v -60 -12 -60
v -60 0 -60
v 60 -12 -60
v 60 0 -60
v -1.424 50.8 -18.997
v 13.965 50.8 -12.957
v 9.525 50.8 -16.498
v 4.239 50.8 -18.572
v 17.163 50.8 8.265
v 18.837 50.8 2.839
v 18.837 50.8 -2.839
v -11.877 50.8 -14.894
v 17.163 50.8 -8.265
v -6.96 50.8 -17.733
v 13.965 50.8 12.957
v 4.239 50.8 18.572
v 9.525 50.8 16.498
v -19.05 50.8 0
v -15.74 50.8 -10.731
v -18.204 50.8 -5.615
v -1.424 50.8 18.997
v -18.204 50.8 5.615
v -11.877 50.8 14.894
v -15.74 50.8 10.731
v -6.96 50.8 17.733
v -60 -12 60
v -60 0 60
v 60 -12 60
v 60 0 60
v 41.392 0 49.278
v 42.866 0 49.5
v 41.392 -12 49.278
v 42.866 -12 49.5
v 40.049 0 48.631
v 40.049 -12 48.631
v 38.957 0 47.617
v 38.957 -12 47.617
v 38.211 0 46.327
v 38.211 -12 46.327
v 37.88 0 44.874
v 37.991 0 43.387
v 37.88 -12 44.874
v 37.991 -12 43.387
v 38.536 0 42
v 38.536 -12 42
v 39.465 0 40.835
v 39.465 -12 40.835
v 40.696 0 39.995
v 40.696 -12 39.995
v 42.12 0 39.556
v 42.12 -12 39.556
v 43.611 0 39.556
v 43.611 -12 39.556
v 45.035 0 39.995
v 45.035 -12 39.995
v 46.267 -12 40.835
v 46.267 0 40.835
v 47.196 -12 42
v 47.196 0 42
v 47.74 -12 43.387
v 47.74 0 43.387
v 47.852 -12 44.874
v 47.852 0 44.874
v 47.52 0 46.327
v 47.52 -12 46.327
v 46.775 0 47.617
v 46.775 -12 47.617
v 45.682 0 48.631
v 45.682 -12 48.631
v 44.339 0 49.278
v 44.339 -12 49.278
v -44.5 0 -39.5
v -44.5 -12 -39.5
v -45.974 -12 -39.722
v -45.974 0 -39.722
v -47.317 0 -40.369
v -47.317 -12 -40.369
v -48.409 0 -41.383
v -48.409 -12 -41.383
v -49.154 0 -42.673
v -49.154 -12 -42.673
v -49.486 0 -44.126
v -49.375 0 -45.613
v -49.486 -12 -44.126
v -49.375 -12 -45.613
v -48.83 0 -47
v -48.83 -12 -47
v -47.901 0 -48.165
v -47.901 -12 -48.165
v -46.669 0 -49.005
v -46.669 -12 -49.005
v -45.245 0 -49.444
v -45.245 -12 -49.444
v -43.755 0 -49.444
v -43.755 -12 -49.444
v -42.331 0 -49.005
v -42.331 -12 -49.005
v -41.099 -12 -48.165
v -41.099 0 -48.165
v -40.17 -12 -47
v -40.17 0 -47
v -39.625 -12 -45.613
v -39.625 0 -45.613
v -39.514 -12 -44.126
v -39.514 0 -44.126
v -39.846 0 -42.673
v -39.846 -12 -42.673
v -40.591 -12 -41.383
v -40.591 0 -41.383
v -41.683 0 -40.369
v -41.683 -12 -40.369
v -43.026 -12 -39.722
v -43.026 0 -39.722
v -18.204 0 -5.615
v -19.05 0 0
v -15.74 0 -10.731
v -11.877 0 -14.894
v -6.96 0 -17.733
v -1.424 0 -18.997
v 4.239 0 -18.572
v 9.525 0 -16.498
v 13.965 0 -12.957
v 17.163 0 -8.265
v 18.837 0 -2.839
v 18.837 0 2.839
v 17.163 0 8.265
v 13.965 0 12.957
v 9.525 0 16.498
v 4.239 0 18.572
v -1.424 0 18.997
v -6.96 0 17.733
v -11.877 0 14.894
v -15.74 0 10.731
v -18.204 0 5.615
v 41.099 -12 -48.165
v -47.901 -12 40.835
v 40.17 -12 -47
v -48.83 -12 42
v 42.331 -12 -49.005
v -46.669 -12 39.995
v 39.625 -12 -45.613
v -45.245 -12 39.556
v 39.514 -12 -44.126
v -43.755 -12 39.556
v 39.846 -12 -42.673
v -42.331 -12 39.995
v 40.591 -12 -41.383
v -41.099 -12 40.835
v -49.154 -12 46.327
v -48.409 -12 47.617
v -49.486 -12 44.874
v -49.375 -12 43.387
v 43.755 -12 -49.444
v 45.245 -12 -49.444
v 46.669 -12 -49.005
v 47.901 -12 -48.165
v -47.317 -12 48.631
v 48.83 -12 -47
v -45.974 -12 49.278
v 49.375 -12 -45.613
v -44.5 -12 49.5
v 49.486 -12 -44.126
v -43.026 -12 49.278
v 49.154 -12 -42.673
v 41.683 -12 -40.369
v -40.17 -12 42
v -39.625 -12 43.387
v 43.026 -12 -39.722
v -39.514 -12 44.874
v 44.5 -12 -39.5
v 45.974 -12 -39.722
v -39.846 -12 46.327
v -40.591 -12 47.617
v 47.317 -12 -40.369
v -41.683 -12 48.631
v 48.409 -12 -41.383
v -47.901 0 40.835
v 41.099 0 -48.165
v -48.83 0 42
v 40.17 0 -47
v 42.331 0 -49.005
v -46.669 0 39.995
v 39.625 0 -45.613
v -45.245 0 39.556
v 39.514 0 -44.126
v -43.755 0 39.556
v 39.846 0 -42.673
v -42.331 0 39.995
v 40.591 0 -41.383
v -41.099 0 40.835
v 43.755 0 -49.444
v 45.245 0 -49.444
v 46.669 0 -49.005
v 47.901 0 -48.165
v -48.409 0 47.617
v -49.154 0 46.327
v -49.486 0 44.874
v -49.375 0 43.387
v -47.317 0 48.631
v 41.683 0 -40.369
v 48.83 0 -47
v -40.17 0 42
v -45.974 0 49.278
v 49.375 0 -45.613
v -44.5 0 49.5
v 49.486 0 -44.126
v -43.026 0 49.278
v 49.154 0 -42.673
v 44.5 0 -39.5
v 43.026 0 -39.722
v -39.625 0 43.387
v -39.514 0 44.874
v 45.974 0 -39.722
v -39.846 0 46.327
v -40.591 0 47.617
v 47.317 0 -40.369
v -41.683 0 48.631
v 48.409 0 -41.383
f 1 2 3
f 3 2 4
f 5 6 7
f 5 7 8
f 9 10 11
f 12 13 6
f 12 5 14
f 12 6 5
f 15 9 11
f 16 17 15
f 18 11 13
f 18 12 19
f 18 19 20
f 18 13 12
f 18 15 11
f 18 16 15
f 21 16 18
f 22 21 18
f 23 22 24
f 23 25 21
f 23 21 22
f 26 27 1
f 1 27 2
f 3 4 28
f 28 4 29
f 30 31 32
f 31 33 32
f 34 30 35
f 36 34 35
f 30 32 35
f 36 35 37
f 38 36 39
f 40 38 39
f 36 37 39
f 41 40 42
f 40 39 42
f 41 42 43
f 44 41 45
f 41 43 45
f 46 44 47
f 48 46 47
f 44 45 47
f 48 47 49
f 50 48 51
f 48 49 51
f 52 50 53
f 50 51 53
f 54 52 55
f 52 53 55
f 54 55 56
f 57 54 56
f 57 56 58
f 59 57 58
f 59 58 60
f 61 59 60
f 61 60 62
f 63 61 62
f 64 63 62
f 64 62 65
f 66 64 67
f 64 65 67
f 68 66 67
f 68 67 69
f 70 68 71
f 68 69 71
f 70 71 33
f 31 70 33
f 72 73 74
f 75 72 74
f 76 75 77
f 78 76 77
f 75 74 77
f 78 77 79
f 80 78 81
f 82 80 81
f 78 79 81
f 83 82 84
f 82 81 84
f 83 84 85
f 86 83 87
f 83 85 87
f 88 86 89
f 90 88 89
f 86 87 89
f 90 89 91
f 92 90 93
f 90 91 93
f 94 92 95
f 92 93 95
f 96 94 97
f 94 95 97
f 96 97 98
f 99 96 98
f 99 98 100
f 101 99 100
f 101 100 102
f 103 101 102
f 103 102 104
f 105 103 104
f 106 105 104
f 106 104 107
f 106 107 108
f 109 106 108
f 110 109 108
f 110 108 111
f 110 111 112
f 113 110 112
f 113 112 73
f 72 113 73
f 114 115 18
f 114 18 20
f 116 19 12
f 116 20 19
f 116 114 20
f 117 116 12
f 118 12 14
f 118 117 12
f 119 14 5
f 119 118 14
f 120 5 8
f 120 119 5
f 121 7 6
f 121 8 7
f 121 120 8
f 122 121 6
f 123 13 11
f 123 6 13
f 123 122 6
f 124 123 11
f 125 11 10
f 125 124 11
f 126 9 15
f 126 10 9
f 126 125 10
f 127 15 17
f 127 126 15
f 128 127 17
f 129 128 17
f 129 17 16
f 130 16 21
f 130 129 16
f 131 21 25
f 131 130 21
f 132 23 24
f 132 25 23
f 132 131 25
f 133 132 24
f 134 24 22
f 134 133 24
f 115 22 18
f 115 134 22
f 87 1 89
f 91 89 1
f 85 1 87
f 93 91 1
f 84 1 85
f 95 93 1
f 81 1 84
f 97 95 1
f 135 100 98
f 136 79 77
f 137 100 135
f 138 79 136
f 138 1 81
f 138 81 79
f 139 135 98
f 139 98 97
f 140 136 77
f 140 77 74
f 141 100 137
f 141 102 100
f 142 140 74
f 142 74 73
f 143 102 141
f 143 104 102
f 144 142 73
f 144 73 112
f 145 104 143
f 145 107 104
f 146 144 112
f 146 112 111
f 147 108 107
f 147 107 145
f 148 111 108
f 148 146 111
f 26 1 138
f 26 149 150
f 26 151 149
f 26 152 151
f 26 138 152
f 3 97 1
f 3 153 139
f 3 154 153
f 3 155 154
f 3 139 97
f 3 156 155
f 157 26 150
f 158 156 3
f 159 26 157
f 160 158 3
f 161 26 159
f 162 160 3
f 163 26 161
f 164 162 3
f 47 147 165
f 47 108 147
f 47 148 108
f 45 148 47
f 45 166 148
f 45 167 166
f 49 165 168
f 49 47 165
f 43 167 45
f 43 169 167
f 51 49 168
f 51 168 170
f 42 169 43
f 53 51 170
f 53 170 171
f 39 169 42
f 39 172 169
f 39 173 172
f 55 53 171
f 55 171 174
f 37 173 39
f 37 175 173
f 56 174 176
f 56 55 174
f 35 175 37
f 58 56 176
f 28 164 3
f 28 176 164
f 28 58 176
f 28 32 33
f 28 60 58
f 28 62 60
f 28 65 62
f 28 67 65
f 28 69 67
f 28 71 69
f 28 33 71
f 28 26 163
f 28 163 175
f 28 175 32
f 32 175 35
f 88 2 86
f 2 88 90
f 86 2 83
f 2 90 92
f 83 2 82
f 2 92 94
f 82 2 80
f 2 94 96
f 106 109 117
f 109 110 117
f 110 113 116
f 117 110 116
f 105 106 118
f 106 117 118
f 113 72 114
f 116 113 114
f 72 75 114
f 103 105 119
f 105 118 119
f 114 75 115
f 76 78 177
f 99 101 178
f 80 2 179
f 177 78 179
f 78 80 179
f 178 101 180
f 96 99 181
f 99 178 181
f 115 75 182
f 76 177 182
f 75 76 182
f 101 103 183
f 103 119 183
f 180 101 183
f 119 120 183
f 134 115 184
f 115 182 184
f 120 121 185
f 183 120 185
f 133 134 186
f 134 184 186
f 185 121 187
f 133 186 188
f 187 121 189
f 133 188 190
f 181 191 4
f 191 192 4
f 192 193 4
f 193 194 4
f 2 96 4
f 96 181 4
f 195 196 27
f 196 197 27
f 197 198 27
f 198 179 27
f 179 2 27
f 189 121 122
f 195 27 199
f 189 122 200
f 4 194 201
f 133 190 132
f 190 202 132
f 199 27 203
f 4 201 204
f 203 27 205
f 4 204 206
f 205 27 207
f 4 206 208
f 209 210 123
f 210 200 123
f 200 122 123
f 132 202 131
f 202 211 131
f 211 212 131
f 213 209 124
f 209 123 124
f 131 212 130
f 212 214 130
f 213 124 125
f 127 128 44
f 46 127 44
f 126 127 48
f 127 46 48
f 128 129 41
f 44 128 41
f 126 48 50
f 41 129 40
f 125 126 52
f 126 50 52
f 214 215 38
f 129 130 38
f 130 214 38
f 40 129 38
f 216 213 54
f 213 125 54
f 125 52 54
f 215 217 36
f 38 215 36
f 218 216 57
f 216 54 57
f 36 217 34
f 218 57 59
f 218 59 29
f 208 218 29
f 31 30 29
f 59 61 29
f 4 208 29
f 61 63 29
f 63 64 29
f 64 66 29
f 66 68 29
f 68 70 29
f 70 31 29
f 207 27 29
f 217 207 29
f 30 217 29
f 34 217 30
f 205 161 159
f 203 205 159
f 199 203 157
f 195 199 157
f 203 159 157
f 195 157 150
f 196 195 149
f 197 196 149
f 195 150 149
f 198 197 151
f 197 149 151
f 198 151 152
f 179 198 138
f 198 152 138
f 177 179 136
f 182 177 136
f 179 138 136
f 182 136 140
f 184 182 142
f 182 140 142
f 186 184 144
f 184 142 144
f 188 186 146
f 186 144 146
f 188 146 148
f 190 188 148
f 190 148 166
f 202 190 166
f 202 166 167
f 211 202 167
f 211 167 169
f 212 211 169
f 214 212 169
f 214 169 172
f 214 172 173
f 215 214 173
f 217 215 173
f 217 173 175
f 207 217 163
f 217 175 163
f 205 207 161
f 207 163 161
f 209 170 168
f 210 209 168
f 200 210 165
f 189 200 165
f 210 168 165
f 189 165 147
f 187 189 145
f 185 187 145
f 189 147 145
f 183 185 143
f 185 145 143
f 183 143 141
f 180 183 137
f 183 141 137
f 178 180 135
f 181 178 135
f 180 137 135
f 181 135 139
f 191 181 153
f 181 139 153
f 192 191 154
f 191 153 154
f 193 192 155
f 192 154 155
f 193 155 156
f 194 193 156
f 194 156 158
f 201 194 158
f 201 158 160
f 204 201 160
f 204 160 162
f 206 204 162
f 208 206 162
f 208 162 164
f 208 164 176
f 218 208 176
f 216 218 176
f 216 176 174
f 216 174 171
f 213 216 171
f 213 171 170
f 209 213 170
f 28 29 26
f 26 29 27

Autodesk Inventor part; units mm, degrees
ref_plane "YZ Plane" through (0, 0, 0) normal (1, 0, 0) x (0, 1, 0)
ref_plane "XZ Plane" through (0, 0, 0) normal (0, 1, 0) x (-1, 0, 0)
ref_plane "XY Plane" through (0, 0, 0) normal (0, 0, 1) x (1, 0, 0)
sketch "Boceto1" plane through (0, 0, 0) normal (0, 1, 0) x (-1, 0, 0)
  circle A0 centre (0, 0) radius 19.05
  line L0 (0, 0) -> (0, 22.5) construction
  line L1 (0, 22.5) -> (-32.5, 22.5) construction
  line L2 (-32.5, 22.5) -> (32.5, 22.5)
  line L3 (32.5, 22.5) -> (32.5, -22.5)
  line L4 (32.5, -22.5) -> (-32.5, -22.5)
  line L5 (-32.5, -22.5) -> (-32.5, 22.5)
  dimension "d0" = 38.1
  dimension "d1" = 22.5
  dimension "d2" = 32.5
  dimension "d3" = 65
  dimension "d4" = 45
extrude "Extrusión1" add sketch "Boceto1" along normal blind 50.8 contours A0
sketch "Boceto2" plane through (0, 0, 0) normal (0, -1, 0) x (1, 0, 0)
  line L0 (0, 0) -> (-60, 0) construction
  line L1 (-60, 0) -> (-60, -60) construction
  line L2 (-60, -60) -> (60, -60)
  line L3 (60, -60) -> (60, 60)
  line L4 (60, 60) -> (-60, 60)
  line L5 (-60, 60) -> (-60, -60)
  dimension "d7" = 60
  dimension "d8" = 60
  dimension "d9" = 120
  dimension "d10" = 120
extrude "Extrusión2" add sketch "Boceto2" along normal blind 12
thread "Rosca1" size "M16x2" class "6g" standard "ANSI Metric M Profile" full length
sketch "Sketch4" plane through (0, 0, 0) normal (0, 1, 0) x (1, 0, 0)
  line L0 (60, 60) -> (60, -60) construction
  line L1 (-60, 60) -> (60, 60) construction
  line L2 (-60, -60) -> (-60, 60) construction
  line L3 (60, -60) -> (-60, -60) construction
  circle A0 centre (0, 0) radius 19.05 construction
  line L4 (-60, 60) -> (60, 60) construction
  line L5 (0, 60) -> (0, -60) construction
  line L6 (60, 60) -> (60, -60) construction
  line L7 (60, 0) -> (-60, 0) construction
  point P0 (-44.5, 44.5)
  point P1 (44.5, 44.5)
  point P2 (-44.5, -44.5)
  point P3 (42.8657, -44.5)
  dimension "d34" = 89
  dimension "d35" = 89
  dimension "d36" = 89
hole "Hole1" at (-44.5, 0, -44.5) at (44.5, 0, -44.5) at (-44.5, 0, 44.5) at (42.8657, 0, 44.5) direction (0, -1, 0) diameter 10 end through all
equation "\"d7\" = 0.5 * d9"
equation "\"d8\" = 0.5 * d10"
properties part number "conector cardan"
